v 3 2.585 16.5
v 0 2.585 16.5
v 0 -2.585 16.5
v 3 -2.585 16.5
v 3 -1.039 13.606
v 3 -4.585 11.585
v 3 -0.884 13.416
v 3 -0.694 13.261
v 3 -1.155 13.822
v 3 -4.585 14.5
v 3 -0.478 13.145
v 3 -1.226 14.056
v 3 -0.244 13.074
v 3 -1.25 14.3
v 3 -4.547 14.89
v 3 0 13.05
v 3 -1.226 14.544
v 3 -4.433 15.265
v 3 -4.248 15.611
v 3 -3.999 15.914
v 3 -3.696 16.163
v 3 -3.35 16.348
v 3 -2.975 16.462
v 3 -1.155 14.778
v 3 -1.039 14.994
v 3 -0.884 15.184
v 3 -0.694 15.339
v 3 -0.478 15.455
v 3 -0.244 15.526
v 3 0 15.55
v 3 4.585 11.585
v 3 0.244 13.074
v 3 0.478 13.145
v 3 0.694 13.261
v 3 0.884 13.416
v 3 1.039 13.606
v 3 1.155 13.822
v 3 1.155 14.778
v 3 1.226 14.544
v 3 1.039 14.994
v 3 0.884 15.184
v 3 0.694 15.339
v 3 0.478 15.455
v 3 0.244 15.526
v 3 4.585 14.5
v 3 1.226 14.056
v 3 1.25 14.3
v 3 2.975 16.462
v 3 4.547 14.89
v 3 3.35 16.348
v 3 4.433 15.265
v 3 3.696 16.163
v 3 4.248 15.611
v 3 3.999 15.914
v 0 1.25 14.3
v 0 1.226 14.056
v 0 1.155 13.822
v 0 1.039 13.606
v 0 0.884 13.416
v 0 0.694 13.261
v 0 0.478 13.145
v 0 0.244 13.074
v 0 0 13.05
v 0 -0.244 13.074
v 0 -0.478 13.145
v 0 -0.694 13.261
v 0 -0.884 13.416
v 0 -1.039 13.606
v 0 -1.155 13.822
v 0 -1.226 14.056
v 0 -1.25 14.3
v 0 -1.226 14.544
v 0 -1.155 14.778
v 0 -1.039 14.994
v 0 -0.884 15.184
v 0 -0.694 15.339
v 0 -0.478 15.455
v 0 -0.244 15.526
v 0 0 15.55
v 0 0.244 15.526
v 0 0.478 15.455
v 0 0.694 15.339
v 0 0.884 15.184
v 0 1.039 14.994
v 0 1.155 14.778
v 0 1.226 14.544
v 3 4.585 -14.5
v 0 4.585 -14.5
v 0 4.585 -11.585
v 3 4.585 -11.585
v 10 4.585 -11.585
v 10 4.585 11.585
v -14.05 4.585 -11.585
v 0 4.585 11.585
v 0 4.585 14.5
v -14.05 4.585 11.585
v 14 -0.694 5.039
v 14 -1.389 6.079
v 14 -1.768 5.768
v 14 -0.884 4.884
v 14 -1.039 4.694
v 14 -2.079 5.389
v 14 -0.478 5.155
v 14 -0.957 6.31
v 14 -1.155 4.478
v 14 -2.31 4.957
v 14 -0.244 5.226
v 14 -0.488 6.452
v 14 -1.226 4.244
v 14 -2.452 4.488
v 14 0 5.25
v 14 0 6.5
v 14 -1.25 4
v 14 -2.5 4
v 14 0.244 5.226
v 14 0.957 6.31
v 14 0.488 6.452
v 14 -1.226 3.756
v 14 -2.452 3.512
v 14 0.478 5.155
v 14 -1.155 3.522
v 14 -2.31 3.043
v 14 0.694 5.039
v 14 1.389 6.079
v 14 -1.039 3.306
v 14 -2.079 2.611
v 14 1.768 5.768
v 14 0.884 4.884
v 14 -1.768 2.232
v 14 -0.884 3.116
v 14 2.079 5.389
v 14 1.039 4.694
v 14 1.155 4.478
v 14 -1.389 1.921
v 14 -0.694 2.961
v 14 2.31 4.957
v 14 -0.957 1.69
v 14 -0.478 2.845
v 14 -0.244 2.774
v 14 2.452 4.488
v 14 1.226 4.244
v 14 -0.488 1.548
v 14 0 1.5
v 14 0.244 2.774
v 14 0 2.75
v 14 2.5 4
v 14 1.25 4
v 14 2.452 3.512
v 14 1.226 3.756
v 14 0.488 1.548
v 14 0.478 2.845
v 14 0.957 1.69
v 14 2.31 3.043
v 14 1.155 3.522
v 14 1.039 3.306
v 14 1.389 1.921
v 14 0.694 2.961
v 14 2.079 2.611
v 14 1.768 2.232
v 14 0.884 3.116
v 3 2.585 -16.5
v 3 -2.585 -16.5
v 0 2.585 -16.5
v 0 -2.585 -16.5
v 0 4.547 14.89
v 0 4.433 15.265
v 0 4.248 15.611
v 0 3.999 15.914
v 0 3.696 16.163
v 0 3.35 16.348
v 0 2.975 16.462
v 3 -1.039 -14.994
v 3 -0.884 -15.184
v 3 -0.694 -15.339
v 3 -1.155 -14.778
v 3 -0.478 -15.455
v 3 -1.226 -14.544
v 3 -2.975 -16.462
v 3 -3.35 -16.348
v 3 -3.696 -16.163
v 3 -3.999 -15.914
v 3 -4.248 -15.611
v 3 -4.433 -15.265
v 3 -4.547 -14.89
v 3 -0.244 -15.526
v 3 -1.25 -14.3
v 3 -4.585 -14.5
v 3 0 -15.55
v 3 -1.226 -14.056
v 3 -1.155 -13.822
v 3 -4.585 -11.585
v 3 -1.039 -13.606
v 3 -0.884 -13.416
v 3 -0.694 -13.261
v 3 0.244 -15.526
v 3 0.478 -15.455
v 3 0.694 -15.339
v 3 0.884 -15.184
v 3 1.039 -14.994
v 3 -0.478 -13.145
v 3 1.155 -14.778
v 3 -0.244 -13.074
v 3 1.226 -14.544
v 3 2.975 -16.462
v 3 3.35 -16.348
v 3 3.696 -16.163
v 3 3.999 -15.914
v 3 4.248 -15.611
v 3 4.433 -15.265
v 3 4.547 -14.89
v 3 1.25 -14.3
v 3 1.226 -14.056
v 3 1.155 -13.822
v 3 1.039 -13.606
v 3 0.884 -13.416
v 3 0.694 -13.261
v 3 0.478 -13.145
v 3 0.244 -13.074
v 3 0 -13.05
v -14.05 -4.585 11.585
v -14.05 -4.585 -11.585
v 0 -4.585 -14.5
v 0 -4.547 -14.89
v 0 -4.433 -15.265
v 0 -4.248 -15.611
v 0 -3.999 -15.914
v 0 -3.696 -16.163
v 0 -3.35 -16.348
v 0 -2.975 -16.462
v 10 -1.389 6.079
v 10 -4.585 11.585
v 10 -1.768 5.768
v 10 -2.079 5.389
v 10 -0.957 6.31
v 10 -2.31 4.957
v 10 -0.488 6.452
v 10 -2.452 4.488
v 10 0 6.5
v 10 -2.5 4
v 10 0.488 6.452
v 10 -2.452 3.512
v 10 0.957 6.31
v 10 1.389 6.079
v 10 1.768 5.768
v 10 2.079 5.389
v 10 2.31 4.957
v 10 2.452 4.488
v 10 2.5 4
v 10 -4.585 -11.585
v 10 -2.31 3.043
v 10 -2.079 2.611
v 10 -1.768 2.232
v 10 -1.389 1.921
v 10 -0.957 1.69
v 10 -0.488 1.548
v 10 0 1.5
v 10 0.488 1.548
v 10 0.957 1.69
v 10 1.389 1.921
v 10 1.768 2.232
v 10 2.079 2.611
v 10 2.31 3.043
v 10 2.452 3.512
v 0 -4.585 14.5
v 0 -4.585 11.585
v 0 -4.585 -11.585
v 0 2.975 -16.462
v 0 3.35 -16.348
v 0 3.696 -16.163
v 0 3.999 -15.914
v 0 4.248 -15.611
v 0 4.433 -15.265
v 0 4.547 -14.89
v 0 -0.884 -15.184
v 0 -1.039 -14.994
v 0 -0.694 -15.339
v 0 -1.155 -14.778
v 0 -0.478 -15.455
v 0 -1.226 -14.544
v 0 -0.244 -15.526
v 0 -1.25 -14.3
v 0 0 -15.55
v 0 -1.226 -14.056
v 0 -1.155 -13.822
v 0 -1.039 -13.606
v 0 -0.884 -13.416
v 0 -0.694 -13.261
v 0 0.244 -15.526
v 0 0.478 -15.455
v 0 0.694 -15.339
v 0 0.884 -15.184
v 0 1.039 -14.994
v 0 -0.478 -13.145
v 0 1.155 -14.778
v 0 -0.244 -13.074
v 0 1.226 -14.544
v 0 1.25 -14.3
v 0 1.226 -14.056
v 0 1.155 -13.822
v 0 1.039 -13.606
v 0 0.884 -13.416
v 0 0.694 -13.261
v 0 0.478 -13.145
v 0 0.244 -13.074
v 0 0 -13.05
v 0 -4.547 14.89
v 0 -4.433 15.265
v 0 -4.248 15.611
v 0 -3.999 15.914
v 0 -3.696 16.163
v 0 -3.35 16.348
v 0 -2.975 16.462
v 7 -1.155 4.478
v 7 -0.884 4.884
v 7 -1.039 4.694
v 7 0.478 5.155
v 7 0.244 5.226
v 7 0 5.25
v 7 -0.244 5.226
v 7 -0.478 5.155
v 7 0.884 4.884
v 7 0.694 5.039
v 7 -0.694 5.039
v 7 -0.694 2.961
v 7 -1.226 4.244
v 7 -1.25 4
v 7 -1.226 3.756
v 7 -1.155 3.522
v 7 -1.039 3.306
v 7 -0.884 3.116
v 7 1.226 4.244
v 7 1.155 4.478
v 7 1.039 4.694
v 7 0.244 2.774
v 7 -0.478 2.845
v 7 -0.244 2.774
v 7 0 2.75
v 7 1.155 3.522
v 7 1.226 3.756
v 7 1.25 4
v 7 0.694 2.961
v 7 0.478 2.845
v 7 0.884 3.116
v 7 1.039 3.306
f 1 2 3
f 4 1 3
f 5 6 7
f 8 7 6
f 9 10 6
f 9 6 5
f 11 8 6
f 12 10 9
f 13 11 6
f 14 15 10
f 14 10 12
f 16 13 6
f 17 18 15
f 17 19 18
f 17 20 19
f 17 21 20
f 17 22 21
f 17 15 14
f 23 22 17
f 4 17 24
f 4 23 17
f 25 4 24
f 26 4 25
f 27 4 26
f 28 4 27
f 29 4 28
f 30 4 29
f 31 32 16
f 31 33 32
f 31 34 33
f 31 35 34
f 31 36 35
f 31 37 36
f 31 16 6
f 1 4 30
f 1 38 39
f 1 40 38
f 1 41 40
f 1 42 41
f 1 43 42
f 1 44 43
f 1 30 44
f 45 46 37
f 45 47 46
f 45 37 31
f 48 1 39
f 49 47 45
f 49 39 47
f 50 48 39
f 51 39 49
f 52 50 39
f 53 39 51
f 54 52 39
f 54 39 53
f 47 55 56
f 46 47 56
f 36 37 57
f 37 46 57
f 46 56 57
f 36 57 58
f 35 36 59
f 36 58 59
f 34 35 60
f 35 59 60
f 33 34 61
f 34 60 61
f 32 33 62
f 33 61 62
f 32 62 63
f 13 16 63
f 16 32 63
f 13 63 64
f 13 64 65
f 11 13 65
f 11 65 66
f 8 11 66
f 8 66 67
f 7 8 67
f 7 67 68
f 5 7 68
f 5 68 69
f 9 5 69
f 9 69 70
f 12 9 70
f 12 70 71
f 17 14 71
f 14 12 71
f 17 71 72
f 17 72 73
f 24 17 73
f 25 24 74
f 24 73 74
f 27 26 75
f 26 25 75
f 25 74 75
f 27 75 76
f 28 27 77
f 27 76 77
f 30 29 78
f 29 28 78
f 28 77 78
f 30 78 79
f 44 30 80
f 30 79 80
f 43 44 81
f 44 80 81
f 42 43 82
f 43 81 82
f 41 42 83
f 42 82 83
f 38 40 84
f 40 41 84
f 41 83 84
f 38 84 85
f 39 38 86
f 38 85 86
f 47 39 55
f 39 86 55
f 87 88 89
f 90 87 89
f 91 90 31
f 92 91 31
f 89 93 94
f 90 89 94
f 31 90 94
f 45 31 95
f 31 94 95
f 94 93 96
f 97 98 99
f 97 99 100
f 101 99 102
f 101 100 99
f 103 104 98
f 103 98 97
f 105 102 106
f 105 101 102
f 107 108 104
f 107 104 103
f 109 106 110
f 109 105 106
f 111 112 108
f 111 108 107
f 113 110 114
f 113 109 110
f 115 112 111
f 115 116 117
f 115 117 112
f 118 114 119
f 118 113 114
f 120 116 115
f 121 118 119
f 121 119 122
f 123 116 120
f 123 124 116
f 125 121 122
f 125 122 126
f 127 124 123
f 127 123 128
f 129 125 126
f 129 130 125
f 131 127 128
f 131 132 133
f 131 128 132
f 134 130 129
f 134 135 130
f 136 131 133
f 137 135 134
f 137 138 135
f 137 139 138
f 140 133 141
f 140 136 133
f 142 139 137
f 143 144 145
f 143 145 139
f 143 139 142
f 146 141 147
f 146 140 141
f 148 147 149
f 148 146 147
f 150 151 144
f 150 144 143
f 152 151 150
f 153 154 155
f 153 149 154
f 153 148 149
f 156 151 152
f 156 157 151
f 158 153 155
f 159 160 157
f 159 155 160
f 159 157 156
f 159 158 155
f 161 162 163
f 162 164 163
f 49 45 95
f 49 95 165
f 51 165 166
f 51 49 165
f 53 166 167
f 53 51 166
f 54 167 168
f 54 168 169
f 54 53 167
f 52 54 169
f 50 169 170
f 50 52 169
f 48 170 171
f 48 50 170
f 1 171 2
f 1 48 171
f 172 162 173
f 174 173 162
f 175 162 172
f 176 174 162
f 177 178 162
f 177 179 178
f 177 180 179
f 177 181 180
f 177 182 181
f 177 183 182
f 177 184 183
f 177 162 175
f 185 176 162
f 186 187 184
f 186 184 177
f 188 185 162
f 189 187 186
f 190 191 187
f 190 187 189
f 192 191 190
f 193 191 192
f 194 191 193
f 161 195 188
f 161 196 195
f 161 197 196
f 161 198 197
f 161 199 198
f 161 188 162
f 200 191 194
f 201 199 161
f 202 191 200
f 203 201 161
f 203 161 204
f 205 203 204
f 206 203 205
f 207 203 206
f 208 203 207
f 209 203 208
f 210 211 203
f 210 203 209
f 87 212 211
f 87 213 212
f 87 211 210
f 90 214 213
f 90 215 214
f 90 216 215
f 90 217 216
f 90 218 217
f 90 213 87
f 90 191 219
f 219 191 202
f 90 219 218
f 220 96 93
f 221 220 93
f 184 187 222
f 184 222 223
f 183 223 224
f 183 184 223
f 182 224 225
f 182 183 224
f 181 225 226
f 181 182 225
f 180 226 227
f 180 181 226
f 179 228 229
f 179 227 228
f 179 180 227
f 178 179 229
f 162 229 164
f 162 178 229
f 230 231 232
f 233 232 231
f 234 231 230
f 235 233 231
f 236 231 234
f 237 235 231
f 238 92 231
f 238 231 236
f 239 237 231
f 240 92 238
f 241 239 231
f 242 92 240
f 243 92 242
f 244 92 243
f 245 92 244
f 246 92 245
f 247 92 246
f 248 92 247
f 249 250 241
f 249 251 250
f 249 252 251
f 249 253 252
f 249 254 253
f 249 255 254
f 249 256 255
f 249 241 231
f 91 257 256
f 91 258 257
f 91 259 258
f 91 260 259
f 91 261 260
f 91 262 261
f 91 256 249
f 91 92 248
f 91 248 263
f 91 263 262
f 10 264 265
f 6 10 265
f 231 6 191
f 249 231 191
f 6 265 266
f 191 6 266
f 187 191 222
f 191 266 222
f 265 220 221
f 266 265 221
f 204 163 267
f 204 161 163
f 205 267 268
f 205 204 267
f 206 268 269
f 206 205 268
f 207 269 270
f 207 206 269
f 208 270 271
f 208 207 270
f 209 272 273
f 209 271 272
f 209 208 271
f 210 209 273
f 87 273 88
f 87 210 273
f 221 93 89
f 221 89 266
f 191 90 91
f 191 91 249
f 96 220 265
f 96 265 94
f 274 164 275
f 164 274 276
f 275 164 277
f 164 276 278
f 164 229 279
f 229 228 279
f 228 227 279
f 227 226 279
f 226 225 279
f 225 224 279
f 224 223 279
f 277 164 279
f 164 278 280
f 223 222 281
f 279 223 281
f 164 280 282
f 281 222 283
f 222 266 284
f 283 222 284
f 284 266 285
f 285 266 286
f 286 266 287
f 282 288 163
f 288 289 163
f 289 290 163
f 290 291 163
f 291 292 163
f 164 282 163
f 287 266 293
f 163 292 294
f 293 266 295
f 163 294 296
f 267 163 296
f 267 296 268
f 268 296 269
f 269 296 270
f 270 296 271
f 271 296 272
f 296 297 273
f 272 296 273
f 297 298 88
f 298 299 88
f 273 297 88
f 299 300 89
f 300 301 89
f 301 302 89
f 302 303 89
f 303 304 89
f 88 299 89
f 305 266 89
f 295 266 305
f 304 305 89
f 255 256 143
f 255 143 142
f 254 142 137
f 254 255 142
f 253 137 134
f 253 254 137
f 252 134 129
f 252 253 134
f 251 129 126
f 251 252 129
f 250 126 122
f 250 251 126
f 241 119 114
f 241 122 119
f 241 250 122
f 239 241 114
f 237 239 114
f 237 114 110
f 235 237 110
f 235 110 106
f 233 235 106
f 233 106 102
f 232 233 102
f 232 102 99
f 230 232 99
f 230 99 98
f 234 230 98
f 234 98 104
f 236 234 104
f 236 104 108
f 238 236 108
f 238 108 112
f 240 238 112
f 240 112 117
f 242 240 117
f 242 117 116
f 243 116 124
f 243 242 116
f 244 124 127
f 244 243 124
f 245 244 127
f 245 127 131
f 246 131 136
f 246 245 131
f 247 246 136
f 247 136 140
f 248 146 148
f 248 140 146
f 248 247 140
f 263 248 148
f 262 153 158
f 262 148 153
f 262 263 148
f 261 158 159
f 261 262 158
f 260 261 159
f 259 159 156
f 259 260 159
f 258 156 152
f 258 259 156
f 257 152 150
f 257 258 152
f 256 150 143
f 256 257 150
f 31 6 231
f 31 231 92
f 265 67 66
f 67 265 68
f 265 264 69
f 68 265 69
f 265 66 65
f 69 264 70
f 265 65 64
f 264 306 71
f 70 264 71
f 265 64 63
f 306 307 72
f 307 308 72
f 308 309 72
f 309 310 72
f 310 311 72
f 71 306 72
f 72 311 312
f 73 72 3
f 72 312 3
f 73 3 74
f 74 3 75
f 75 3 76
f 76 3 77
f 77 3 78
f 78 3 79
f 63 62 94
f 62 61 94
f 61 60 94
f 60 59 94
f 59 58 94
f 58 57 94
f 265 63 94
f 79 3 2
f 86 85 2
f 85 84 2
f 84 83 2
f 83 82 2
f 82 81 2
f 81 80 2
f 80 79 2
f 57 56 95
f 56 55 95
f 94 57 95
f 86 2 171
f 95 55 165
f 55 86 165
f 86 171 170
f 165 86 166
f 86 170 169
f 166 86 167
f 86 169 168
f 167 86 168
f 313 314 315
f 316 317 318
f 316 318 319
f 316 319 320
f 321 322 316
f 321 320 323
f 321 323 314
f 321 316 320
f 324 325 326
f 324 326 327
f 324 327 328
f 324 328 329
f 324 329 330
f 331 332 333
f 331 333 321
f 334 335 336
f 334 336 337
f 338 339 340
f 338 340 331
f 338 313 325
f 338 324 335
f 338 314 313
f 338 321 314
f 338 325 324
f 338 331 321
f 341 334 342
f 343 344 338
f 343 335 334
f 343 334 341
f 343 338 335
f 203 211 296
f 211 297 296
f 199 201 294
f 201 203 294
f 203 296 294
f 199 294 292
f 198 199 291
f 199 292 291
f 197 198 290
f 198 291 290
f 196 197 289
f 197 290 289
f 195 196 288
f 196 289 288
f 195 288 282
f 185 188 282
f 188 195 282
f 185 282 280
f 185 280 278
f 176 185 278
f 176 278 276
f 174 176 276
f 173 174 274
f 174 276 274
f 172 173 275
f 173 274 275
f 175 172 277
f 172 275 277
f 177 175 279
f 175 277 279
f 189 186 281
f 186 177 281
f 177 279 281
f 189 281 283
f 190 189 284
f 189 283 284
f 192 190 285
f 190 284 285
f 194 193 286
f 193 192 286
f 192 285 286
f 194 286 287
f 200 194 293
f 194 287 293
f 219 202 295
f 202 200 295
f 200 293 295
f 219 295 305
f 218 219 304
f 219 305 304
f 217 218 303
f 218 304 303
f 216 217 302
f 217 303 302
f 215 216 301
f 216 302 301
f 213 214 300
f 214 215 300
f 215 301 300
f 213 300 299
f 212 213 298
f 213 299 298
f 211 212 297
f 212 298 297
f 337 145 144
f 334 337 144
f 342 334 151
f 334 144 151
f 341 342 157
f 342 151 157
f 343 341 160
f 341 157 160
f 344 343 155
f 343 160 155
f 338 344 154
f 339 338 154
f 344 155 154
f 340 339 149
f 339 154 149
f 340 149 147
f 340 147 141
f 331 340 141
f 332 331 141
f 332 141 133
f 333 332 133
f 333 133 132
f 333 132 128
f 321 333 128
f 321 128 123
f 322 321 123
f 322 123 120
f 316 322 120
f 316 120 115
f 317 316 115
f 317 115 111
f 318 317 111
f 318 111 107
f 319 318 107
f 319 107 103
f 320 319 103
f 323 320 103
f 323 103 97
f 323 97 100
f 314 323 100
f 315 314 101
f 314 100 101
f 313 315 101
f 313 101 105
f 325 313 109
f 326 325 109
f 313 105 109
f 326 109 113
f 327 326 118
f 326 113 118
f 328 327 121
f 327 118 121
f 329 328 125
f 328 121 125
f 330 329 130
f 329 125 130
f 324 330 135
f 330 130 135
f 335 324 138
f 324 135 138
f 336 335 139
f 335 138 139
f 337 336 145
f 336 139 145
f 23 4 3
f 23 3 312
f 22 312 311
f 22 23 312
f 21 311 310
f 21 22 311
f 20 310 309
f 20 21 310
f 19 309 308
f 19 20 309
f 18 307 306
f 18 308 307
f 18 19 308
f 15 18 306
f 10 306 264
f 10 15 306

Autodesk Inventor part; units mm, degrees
ref_plane "YZ Plane" through (0, 0, 0) normal (1, 0, 0) x (0, 1, 0)
ref_plane "XZ Plane" through (0, 0, 0) normal (0, 1, 0) x (-1, 0, 0)
ref_plane "XY Plane" through (0, 0, 0) normal (0, 0, 1) x (1, 0, 0)
sketch "Sketch7" plane through (0, 0, 0) normal (1, 0, 0) x (0, 1, 0)
  line L0 (4.585, 16.5) -> (-4.585, 16.5)
  line L1 (-4.585, 16.5) -> (-4.585, -16.5)
  line L2 (-4.585, -16.5) -> (4.585, -16.5)
  line L3 (4.585, -16.5) -> (4.585, 16.5)
  circle A0 centre (0, 14.3) radius 1.25
  circle A1 centre (0, -14.3) radius 1.25
  line L4 (4.585, 0) -> (-4.585, 0) construction
  line L5 (4.585, 11.585) -> (-4.585, 11.585)
  line L6 (4.585, -11.585) -> (-4.585, -11.585)
  point P0 (0, 0)
  point P1 (0, 16.5)
  point P2 (0, 0)
  dimension "d85" = 33
  dimension "d86" = 9.17
  dimension "d87" = 2.5
  dimension "d89" = 28.6
  dimension "d90" = 23.17
extrude "Extrusion3" add sketch "Sketch7" along normal blind 3
fillet "Fillet1" radius 2 1 edges at (1.5, 4.585, 16.5)
fillet "Fillet2" radius 2 1 edges at (1.5, 4.585, -16.5)
fillet "Fillet3" radius 2 1 edges at (1.5, -4.585, -16.5)
fillet "Fillet4" radius 2 1 edges at (1.5, -4.585, 16.5)
sketch "Sketch8" plane through (3, 0, 0) normal (1, 0, 0) x (0, 0, -1)
  line L0 (14.5, 4.585) -> (-14.5, 4.585) projected
  line L1 (-14.5, -4.585) -> (14.5, -4.585) projected
  line L2 (-11.585, 4.585) -> (11.585, 4.585)
  line L3 (11.585, 4.585) -> (11.585, -4.585)
  line L4 (11.585, -4.585) -> (-11.585, -4.585)
  line L5 (-11.585, -4.585) -> (-11.585, 4.585)
  line L6 (0, 4.585) -> (0, -4.585) construction
  line L7 (-11.585, 4.585) -> (11.585, 4.585)
  line L8 (11.585, -4.585) -> (-11.585, -4.585)
  point P0 (0, 0)
  point P1 (0, 0)
  point P2 (0, 4.585)
  point P3 (-11.585, -4.585)
  point P4 (11.585, 4.585)
  dimension "d97" = 23.17
extrude "Extrusion4" add sketch "Sketch8" along normal blind 7 and the other way blind 17.05
sketch "Sketch9" plane through (10, 0, 0) normal (1, 0, 0) x (0, 0, -1)
  circle A0 centre (-4, 0) radius 2.5
  point P0 (0, 0)
  dimension "d102" = 5
  dimension "d103" = 4
extrude "Extrusion5" add sketch "Sketch9" along normal blind 4
sketch "Sketch11" plane through (14, 0, 4) normal (1, 0, 0) x (0, 0, -1)
  circle A0 centre (0, 0) radius 1.25
  circle A1 centre (0, 0) radius 2.5 projected
  point P0 (4, 0)
  dimension "d107" = 2.5
extrude "Extrusion6" cut sketch "Sketch11" against normal blind 7 contours A0
properties part number "6P-014"
